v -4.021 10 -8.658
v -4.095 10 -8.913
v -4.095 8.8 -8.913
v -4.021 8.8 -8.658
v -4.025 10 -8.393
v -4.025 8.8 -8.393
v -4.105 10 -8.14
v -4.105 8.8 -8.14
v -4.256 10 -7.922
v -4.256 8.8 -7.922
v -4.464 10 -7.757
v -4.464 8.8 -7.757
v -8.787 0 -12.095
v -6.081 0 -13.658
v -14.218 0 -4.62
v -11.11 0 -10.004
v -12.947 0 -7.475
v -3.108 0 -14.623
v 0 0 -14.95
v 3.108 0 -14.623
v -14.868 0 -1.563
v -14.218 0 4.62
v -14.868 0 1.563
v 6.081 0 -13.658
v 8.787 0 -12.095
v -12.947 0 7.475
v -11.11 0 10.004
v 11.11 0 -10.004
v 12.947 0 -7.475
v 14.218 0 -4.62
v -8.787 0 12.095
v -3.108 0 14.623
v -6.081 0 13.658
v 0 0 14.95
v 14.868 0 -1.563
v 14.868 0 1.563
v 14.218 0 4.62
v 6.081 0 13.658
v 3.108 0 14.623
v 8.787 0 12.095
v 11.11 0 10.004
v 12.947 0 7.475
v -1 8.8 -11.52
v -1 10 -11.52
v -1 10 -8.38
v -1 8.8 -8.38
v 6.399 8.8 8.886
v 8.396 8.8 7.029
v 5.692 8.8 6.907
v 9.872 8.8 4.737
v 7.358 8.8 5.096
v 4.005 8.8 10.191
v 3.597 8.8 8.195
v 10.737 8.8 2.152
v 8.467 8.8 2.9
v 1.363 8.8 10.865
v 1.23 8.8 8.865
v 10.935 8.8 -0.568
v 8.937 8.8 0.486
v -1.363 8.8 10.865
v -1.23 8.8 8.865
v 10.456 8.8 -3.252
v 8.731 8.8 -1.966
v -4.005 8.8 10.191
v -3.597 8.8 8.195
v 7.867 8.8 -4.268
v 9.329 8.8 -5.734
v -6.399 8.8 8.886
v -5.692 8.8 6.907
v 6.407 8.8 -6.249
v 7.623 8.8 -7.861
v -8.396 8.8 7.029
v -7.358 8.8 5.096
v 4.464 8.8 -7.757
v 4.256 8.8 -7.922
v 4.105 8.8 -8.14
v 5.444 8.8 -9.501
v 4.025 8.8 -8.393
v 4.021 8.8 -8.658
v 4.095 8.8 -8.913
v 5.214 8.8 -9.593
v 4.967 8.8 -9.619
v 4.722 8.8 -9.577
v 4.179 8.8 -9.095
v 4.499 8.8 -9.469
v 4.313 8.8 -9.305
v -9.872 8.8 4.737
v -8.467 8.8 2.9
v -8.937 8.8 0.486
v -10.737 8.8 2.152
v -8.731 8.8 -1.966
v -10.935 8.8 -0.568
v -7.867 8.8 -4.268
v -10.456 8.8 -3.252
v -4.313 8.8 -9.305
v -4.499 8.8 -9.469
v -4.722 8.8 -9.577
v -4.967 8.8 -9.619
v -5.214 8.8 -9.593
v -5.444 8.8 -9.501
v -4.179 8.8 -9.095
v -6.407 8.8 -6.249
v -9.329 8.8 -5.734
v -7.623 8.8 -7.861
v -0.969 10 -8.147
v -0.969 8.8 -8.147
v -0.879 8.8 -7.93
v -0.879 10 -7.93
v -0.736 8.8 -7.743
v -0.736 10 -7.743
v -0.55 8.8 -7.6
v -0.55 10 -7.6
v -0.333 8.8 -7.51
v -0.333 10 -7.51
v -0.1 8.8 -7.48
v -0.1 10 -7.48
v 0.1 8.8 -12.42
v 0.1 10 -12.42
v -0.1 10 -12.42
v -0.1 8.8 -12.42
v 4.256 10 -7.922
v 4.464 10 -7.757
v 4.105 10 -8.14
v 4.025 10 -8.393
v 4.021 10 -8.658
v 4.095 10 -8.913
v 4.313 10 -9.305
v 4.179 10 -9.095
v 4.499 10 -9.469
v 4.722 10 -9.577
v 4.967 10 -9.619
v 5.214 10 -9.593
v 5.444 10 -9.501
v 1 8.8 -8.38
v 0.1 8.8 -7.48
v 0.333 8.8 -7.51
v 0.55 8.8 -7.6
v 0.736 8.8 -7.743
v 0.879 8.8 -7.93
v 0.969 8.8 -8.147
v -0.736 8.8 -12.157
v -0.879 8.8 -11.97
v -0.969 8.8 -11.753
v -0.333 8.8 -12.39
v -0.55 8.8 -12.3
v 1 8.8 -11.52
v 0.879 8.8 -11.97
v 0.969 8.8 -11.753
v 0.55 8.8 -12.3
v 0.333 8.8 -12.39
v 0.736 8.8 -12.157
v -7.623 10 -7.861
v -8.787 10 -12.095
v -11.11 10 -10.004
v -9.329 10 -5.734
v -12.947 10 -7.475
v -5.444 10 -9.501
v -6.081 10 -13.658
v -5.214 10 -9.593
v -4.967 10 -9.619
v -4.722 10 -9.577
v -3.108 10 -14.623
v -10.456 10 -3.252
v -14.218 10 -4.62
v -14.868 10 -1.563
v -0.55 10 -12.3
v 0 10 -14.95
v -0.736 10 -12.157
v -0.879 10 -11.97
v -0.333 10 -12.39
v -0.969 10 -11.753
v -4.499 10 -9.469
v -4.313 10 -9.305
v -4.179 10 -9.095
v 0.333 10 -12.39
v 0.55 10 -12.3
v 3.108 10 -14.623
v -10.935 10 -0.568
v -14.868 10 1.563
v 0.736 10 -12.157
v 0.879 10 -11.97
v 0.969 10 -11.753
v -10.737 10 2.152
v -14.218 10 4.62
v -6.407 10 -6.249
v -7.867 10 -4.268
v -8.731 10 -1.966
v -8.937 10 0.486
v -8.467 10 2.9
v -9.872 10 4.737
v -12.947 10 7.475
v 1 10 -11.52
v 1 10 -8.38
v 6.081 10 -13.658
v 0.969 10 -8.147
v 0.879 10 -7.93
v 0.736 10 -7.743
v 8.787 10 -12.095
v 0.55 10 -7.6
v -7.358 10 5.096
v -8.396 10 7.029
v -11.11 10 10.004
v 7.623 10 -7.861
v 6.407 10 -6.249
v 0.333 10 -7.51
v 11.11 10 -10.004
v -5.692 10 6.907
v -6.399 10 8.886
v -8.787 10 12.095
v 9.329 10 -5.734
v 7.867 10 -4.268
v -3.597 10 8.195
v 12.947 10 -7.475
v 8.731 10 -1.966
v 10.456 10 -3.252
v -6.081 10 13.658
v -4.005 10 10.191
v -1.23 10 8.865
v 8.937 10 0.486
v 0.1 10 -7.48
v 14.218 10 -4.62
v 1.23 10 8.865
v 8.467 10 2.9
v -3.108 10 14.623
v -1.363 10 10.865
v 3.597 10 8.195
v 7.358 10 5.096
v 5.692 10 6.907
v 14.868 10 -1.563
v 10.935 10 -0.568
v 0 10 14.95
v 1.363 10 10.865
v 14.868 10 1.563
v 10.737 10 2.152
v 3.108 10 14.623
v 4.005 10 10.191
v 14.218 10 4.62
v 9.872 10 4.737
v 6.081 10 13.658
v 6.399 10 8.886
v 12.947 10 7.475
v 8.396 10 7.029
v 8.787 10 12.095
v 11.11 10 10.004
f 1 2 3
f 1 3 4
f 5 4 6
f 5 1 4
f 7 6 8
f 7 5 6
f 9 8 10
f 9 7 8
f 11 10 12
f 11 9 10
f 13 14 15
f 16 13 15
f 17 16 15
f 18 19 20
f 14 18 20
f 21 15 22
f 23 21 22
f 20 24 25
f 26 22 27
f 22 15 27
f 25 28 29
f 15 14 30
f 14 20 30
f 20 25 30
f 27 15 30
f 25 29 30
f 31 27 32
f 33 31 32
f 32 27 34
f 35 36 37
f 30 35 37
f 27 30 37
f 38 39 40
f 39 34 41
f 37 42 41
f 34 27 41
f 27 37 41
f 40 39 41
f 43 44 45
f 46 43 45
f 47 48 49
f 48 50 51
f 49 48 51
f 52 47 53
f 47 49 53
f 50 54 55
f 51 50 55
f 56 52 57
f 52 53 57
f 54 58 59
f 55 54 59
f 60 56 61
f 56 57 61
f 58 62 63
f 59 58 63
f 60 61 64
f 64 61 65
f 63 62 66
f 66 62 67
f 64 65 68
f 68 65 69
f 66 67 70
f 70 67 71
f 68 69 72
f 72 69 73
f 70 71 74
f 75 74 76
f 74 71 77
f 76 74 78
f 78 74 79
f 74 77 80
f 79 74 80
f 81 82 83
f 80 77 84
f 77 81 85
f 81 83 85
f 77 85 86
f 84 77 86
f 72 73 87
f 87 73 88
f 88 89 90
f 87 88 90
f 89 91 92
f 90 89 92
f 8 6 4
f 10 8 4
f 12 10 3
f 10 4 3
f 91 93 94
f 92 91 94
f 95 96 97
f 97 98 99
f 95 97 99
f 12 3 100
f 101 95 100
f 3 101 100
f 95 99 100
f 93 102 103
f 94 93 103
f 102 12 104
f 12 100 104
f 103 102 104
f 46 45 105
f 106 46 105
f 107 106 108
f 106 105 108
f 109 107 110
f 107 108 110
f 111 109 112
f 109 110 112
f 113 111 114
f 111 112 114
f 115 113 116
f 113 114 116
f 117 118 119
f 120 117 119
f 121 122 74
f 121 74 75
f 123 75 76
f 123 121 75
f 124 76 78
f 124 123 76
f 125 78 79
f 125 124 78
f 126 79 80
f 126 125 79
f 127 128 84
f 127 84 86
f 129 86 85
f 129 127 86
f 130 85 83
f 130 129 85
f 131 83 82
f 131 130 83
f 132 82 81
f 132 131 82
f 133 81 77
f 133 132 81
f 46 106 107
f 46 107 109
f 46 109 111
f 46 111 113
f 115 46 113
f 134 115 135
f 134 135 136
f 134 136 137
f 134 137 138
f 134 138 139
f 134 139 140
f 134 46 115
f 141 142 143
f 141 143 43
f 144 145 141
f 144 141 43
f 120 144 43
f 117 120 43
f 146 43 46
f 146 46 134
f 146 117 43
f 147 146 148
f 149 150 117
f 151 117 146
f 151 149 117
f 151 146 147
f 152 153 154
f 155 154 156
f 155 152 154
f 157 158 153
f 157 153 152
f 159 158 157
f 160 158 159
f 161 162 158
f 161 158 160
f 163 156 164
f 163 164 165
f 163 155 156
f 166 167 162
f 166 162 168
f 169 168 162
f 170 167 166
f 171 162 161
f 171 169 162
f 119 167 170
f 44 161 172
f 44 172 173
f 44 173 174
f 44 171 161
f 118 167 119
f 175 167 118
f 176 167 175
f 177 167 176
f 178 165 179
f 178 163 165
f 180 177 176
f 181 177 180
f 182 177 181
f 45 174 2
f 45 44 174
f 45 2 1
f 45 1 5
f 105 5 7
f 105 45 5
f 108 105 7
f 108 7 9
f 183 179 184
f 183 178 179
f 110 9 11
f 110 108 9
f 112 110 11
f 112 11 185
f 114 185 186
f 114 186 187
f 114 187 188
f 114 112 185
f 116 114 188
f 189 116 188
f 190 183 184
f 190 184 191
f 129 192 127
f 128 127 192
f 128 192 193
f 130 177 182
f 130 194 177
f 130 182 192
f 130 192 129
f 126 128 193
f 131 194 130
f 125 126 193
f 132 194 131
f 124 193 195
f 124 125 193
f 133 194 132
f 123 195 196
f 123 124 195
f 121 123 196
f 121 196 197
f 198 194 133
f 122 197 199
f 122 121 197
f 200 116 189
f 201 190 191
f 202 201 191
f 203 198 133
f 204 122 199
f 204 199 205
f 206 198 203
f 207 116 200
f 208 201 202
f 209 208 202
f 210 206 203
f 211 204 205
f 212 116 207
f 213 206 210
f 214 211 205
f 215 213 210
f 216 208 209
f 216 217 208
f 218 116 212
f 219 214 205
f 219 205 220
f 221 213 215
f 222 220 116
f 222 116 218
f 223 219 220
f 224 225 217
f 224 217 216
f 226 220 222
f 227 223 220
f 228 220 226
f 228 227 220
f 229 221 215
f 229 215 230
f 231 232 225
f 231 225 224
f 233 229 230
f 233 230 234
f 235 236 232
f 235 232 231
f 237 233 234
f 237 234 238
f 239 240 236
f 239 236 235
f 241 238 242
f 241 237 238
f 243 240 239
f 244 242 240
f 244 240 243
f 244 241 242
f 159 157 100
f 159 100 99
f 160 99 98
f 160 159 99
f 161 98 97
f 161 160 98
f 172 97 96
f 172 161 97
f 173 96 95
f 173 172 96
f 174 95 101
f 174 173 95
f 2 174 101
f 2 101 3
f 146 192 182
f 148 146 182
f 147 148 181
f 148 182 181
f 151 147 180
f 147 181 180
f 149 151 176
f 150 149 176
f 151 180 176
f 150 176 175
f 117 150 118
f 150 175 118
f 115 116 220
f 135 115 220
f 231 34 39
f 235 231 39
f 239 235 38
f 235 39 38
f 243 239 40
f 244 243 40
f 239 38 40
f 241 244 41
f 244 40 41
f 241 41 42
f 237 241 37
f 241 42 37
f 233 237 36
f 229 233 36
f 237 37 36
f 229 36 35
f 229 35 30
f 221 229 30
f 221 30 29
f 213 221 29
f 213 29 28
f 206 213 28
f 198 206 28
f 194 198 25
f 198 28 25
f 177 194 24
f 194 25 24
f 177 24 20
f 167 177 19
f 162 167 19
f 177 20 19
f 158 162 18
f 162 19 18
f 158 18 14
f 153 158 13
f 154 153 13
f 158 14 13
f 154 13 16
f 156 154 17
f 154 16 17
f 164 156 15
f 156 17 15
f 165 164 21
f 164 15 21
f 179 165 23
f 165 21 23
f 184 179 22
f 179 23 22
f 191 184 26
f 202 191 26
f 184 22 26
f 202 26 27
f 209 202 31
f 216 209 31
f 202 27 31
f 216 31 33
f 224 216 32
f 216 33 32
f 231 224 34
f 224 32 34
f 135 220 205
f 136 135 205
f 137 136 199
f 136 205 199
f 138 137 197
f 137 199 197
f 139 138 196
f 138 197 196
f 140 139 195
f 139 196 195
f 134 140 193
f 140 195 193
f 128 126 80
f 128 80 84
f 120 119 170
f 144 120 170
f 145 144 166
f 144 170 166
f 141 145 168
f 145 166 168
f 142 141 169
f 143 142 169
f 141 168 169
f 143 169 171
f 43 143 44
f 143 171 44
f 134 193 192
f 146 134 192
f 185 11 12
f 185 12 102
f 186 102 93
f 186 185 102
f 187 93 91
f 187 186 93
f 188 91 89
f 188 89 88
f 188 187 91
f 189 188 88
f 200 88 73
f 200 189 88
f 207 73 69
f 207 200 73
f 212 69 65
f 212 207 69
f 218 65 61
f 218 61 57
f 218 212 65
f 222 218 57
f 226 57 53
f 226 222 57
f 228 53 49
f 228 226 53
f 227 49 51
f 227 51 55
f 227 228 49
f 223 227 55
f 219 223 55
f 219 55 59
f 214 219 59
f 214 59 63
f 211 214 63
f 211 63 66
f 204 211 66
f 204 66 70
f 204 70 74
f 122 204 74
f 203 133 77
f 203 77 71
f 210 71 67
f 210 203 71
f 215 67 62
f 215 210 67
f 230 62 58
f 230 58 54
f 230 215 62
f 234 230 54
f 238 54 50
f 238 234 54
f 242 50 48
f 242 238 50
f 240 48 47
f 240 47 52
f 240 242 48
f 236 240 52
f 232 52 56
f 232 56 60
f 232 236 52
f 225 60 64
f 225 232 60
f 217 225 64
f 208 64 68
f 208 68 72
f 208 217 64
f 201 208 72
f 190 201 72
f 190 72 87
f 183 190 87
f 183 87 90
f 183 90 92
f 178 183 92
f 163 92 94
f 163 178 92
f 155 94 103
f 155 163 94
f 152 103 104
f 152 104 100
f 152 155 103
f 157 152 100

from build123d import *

# Parameters (mm, degrees)
SKETCH1_R           = 14.95
BOSS_EXTRUDE1_DEPTH = 10
CUT_EXTRUDE1_DEPTH  = 1.2


with BuildPart() as part:
    # Sketch1 → Boss-Extrude1 (new body)
    with BuildSketch(Plane(origin=(0, 0, 0), x_dir=(1, 0, 0), z_dir=(0, 1, 0))):
        with Locations(Location((0, 0, 0), (0, 0, 270))):  # turned: the seam where the file's is
            Circle(SKETCH1_R)
    extrude(amount=BOSS_EXTRUDE1_DEPTH)

    # Sketch2 → Cut-Extrude1 (cut)
    with BuildSketch(Plane(origin=(0, 10, 0), x_dir=(1, 0, 0), z_dir=(0, 1, 0))):
        with BuildLine():
            ThreePointArc((1, 8.893958624), (0, 8.95), (-1, 8.893958624))
            Line((-1, 8.893958624), (-1, 8.379586094))
            ThreePointArc((-1, 8.379586094), (-0.736396103, 7.743189991), (-0.1, 7.479586094))
            Line((-0.1, 7.479586094), (0.1, 7.479586094))
            ThreePointArc((0.1, 7.479586094), (0.736396103, 7.743189991), (1, 8.379586094))
            Line((1, 8.379586094), (1, 8.893958624))
        make_face()
        with BuildLine():
            ThreePointArc((1, 10.904242294), (0, 10.95), (-1, 10.904242294))
            Line((-1, 10.904242294), (-1, 8.893958624))
            ThreePointArc((-1, 8.893958624), (0, 8.95), (1, 8.893958624))
            Line((1, 8.893958624), (1, 10.904242294))
        make_face()
        with BuildLine():
            Line((0.1, 12.420413906), (-0.1, 12.420413906))
            ThreePointArc((-0.1, 12.420413906), (-0.736396103, 12.156810009), (-1, 11.520413906))
            Line((-1, 11.520413906), (-1, 10.904242294))
            ThreePointArc((-1, 10.904242294), (0, 10.95), (1, 10.904242294))
            Line((1, 10.904242294), (1, 11.520413906))
            ThreePointArc((1, 11.520413906), (0.736396103, 12.156810009), (0.1, 12.420413906))
        make_face()
        with BuildLine():
            ThreePointArc((-4.464100977, 7.757209709), (0, -8.95), (4.464100977, 7.757209709))
            ThreePointArc((4.464100977, 7.757209709), (4.055618077, 8.263608167), (4.095196767, 8.913016517))
            Line((4.095196767, 8.913016517), (4.179040986, 9.09549979))
            ThreePointArc((4.179040986, 9.09549979), (4.722410459, 9.57688432), (5.444328238, 9.500620508))
            ThreePointArc((5.444328238, 9.500620508), (0, -10.95), (-5.444328238, 9.500620508))
            ThreePointArc((-5.444328238, 9.500620508), (-4.722410459, 9.57688432), (-4.179040986, 9.09549979))
            Line((-4.179040986, 9.09549979), (-4.095196767, 8.913016517))
            ThreePointArc((-4.095196767, 8.913016517), (-4.055618077, 8.263608167), (-4.464100977, 7.757209709))
        make_face()
    extrude(amount=-CUT_EXTRUDE1_DEPTH, mode=Mode.SUBTRACT)


solid = part.part
